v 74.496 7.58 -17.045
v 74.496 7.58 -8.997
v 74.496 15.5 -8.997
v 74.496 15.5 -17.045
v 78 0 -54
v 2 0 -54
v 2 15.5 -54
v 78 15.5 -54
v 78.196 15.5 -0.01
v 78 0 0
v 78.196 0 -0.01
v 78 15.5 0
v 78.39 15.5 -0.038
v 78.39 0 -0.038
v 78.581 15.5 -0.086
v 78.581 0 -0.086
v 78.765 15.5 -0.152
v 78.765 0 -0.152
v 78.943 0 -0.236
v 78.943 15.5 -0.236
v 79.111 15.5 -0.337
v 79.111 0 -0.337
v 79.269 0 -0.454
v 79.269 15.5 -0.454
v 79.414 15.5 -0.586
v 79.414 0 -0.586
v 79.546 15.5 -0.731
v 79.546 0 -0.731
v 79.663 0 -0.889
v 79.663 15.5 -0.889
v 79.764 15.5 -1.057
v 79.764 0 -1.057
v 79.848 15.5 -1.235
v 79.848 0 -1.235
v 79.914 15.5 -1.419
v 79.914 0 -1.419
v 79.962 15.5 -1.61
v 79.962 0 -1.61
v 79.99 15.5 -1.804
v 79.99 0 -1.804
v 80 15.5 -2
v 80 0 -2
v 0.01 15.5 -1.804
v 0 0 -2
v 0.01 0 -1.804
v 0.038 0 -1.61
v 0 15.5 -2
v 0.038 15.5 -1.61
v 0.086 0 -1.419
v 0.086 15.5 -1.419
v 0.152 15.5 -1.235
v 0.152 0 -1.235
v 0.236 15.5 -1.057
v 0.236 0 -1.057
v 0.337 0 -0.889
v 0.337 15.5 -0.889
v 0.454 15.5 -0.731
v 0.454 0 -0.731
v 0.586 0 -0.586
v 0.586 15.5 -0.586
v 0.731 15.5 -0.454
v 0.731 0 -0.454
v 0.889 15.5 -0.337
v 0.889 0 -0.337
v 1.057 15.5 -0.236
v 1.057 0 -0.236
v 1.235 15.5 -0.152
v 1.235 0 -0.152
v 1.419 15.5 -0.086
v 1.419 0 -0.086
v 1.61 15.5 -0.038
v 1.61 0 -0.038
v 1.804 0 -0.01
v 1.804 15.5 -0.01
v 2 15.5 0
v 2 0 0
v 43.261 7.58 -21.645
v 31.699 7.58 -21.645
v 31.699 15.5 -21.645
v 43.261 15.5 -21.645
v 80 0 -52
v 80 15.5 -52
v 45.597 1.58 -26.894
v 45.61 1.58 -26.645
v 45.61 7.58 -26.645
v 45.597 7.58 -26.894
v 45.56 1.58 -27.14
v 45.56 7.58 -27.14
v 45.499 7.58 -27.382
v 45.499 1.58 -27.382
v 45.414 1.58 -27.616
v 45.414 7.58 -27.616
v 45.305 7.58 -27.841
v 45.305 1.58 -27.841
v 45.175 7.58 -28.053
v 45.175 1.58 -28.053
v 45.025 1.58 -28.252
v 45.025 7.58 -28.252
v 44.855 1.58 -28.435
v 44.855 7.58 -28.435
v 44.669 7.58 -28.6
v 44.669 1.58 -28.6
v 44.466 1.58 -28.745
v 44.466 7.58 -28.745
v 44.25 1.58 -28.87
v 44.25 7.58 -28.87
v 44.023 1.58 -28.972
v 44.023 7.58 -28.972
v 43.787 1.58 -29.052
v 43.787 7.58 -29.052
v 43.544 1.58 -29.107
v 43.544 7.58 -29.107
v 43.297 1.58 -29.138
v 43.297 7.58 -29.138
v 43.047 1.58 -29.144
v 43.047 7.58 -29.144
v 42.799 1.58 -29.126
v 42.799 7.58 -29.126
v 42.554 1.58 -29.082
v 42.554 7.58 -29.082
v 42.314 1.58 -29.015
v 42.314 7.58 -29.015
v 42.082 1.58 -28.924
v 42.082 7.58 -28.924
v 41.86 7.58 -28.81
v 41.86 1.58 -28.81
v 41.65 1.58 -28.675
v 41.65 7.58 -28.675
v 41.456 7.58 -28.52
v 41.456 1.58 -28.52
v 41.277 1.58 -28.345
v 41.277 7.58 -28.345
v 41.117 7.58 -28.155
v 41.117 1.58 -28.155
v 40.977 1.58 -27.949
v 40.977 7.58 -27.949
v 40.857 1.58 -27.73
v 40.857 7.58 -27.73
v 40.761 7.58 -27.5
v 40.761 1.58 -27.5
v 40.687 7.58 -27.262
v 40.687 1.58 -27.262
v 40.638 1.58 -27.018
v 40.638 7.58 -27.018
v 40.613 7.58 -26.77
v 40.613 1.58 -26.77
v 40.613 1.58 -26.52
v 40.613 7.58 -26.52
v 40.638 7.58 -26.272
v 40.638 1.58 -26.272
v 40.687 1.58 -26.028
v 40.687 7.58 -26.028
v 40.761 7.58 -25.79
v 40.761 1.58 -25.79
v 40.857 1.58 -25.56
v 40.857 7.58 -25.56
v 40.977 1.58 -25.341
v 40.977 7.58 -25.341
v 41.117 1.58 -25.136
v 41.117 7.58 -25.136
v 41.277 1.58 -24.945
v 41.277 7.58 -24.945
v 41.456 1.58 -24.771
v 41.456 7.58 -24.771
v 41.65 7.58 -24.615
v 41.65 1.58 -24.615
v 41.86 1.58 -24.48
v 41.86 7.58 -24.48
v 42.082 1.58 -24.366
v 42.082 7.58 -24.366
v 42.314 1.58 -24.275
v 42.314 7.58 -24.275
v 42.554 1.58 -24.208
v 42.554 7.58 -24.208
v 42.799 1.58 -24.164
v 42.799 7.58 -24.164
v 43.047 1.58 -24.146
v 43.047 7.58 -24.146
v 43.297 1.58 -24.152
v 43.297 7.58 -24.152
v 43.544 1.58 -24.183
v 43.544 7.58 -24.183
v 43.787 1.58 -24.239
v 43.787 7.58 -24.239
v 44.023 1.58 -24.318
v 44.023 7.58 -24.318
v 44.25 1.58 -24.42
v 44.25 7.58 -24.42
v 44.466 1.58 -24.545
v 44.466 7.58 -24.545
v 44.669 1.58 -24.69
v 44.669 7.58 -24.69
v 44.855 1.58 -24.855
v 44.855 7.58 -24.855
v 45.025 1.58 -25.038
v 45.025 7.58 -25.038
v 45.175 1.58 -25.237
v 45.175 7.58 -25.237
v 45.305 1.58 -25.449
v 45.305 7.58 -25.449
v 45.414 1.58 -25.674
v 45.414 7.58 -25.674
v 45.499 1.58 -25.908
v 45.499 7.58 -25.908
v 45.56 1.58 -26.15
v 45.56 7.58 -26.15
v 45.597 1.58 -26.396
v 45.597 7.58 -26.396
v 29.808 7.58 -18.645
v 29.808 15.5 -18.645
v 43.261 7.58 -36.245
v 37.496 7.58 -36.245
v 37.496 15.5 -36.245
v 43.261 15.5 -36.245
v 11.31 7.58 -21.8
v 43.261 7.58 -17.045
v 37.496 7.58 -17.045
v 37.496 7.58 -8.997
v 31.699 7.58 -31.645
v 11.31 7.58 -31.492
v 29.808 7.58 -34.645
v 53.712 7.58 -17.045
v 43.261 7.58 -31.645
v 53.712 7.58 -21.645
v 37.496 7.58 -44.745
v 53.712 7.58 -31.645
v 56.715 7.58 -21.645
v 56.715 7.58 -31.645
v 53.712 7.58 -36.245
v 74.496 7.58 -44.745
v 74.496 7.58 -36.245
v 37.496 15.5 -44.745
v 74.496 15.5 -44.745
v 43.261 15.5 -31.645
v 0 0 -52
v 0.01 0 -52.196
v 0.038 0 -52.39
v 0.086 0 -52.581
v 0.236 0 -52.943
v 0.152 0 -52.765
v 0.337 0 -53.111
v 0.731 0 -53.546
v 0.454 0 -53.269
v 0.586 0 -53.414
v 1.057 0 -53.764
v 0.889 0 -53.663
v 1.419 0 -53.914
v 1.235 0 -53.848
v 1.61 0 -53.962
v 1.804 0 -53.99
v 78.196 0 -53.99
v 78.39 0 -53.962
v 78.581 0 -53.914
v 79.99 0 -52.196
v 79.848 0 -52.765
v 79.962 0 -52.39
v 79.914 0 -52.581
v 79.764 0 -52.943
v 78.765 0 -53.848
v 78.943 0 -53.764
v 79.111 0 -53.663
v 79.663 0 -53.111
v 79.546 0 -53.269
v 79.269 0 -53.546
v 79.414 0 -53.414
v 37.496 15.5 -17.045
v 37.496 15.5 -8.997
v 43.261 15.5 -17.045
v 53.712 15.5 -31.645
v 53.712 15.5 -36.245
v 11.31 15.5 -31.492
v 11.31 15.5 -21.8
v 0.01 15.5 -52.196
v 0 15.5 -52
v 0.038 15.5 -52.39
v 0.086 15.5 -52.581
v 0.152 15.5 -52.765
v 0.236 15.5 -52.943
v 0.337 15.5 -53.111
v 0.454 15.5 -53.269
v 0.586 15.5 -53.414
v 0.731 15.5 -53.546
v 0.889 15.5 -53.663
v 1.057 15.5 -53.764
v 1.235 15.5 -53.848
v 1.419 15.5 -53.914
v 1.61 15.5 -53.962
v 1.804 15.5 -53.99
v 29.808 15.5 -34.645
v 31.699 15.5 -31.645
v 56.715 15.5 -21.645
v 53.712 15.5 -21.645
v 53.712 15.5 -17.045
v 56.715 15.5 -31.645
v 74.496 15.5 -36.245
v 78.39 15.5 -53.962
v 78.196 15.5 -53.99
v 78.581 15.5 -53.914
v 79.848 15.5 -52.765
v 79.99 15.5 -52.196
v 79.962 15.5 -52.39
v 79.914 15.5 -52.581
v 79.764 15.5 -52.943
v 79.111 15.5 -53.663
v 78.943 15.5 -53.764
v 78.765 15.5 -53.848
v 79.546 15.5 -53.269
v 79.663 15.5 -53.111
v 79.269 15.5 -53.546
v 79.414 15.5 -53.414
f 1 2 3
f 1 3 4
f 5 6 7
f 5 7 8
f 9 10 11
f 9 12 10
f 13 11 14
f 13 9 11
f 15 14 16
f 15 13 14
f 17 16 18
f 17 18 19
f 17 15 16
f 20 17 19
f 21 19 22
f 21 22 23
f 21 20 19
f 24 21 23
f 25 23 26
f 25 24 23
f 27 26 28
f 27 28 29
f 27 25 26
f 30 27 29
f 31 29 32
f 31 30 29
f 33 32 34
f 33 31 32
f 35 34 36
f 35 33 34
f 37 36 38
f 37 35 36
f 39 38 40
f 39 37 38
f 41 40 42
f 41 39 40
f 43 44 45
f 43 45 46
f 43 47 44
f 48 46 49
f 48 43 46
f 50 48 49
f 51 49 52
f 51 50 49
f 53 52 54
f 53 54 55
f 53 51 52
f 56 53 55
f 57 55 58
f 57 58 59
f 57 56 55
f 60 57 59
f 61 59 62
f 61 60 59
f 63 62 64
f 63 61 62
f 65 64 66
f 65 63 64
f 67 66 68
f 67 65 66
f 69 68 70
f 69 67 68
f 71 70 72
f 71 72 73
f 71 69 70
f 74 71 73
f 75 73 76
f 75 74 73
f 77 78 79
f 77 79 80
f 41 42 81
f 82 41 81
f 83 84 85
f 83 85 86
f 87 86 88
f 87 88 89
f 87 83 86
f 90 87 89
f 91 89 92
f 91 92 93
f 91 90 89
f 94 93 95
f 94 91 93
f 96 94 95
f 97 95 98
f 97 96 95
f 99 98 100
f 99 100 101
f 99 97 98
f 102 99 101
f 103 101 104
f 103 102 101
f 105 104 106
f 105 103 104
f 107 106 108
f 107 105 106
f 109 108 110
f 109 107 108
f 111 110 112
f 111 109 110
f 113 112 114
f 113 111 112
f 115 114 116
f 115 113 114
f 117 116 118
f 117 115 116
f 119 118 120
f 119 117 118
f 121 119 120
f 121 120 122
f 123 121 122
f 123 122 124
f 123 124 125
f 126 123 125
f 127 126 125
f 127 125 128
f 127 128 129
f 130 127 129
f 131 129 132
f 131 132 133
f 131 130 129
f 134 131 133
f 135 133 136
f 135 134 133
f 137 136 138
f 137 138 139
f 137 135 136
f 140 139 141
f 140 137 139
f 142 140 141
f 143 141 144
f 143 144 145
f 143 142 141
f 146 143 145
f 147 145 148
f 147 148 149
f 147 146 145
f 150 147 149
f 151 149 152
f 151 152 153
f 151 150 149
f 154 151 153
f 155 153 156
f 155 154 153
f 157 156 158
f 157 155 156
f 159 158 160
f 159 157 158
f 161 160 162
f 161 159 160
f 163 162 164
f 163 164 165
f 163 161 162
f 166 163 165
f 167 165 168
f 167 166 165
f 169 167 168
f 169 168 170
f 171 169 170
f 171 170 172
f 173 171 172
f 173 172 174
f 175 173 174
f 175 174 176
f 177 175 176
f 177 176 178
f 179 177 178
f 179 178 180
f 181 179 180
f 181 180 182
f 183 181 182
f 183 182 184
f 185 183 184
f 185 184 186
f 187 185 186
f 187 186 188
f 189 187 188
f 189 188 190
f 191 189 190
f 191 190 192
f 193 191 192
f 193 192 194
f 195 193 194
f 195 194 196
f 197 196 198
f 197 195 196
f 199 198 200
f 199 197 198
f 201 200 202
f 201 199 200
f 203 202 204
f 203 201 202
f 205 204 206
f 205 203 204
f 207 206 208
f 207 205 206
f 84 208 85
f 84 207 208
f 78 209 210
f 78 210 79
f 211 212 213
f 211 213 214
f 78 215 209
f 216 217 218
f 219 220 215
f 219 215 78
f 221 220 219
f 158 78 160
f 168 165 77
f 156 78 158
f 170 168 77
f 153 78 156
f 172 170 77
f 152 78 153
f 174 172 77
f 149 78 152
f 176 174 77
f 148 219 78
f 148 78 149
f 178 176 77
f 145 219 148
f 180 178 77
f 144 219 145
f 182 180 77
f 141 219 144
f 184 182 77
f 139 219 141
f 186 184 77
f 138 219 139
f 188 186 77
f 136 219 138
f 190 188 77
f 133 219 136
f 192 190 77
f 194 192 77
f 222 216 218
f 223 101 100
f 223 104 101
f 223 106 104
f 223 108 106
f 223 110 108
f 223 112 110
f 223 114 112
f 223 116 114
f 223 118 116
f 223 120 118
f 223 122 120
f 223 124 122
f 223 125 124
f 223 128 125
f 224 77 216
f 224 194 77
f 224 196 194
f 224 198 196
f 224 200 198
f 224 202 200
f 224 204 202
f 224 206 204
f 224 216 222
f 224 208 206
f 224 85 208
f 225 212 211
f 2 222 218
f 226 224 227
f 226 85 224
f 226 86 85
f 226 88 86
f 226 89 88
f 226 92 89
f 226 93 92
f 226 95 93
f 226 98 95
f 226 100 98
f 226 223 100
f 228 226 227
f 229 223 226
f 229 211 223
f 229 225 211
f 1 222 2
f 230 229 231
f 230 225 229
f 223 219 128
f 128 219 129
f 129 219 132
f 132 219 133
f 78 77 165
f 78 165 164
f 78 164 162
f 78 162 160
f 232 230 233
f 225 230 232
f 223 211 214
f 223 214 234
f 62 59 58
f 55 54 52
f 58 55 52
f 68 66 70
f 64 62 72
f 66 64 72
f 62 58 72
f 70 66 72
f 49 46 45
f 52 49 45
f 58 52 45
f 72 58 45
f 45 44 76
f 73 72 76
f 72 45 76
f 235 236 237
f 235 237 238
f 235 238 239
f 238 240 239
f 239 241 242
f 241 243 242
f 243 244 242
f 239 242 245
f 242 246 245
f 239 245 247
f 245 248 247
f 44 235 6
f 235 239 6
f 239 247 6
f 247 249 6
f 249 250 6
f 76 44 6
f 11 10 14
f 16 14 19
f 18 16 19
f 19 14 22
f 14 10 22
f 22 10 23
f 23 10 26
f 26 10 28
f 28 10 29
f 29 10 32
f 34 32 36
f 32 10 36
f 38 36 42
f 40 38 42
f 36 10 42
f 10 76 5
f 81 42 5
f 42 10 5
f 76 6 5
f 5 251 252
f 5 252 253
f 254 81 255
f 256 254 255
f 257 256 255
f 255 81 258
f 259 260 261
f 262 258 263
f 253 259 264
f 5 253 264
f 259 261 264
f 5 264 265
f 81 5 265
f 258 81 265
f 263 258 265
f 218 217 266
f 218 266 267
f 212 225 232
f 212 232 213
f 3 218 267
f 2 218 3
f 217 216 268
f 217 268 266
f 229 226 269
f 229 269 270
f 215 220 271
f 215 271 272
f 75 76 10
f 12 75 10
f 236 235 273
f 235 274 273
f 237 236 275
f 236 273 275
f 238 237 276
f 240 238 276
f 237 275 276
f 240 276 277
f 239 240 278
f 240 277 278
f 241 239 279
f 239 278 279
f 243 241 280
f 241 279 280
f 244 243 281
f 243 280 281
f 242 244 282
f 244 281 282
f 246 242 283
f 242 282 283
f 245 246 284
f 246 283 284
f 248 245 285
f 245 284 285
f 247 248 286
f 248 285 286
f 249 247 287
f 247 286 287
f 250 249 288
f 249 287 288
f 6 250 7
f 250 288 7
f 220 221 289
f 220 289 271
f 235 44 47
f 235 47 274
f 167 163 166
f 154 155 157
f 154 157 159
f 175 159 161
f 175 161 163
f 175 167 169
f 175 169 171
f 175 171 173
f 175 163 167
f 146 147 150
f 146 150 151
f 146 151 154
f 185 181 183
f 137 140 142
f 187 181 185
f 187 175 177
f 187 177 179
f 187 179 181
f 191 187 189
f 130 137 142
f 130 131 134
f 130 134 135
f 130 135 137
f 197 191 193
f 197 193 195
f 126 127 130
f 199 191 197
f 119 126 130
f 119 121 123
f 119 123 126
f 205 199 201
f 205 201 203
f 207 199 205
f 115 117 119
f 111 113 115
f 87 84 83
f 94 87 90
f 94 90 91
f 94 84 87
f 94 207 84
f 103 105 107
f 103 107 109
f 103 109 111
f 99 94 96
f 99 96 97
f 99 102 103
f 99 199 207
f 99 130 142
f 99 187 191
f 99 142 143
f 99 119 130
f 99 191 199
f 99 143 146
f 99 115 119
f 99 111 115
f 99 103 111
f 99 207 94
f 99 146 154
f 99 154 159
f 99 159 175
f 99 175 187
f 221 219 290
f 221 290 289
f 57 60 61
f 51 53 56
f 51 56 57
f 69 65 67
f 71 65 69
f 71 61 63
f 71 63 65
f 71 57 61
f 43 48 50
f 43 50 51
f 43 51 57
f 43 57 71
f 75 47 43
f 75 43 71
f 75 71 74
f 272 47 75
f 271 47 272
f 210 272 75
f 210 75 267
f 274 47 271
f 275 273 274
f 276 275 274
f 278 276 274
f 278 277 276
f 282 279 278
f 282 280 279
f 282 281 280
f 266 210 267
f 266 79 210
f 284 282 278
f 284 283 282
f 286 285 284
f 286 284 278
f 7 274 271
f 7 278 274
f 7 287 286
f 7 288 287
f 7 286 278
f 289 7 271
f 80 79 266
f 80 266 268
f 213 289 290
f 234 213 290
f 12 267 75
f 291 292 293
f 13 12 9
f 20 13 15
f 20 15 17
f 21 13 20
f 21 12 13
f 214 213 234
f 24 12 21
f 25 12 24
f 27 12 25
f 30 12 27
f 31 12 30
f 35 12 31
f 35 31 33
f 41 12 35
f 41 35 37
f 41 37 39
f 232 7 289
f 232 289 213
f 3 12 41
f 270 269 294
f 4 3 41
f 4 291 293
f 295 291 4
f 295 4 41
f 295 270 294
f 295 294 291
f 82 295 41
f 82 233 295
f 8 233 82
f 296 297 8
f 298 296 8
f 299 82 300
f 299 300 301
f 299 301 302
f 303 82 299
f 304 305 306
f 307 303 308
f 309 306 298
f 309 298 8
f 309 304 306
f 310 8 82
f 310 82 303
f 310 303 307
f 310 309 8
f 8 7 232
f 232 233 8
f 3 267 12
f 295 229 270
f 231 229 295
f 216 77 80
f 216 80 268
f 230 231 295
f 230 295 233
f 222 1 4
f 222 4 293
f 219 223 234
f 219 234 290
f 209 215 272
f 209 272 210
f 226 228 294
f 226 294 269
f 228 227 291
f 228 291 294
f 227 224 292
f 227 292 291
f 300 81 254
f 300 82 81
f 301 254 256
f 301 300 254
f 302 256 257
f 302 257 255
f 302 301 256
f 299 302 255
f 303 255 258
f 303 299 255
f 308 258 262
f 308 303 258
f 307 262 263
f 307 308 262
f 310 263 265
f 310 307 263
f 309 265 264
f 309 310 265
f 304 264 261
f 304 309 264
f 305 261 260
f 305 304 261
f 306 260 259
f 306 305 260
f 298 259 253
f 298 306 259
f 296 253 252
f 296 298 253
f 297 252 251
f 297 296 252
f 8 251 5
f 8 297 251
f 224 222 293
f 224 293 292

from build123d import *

# Parameters (mm, degrees)
SKETCH1_W           = 80
SKETCH1_H           = 54
BOSS_EXTRUDE2_DEPTH = 15.5
FILLET1_R           = 2
Y_WING_START        = -26.76167351
Y_WING_DEPTH        = 8
Y_WING_START_2      = -32.76167351
Y_WING_2_OUTLINE_R  = 2.5
Y_WING_2_DEPTH      = 6


with BuildPart() as part:
    # Sketch1 → Boss-Extrude2 (new body)
    with BuildSketch(Plane(origin=(0, 0, 0), x_dir=(1, 0, 0), z_dir=(0, 1, 0))):
        with Locations((40, 27)):
            Rectangle(SKETCH1_W, SKETCH1_H)
    extrude(amount=BOSS_EXTRUDE2_DEPTH)

    # Fillet1
    fillet1_edges = [part.edges().sort_by_distance(p)[0] for p in [
        (0, 7.75, -54),
        (80, 7.75, -54),
        (80, 7.75, 0),
        (0, 7.75, 0),
    ]]
    fillet(fillet1_edges, radius=FILLET1_R)


with BuildPart() as body_2:
    # Y-Wing: read off the stored shape, not the designer's step
    # Y-Wing outline → Y-Wing (new body)
    with BuildSketch(Plane(origin=(0, 0, 0), x_dir=(1, 0, 0), z_dir=(0, 1, 0)).offset(Y_WING_START)):
        Polygon((-37.998848216, 80.77793428), (-49.561243891, 80.77793428), (-51.452110178, 83.77793428), (-69.950345376, 80.625586413), (-69.950345376, 70.93293428), (-51.452110178, 67.77793428), (-49.561243891, 70.77793428), (-37.998848216, 70.77793428), (-37.998848216, 66.17793428), (-43.764531914, 66.17793428), (-43.764531914, 58.130000785), (-6.764531914, 58.130000785), (-6.764531914, 66.17793428), (-27.548546514, 66.17793428), (-27.548546514, 70.77793428), (-24.545586254, 70.77793428), (-24.545586254, 80.77793428), (-27.548546514, 80.77793428), (-27.548546514, 85.37793428), (-6.764531914, 85.37793428), (-6.764531914, 93.87793428), (-43.764531914, 93.87793428), (-43.764531914, 85.37793428), (-37.998848216, 85.37793428), align=None)
    extrude(amount=Y_WING_DEPTH)

    # Y-Wing 2 outline → Y-Wing 2 (add)
    with BuildSketch(Plane(origin=(0, 0, 0), x_dir=(1, 0, 0), z_dir=(0, 1, 0)).offset(Y_WING_START_2)):
        with Locations((-38.150345376, 75.778331613)):
            Circle(Y_WING_2_OUTLINE_R)
    extrude(amount=Y_WING_2_DEPTH)


with BuildPart() as body_2_1:
    # Body-Move/Copy3: moved
    add(body_2.part.moved(Location((81.260162004, 34.341820547, 49.133266847))))


with BuildPart() as part_1:
    add(part.part)

    # Intersect1: read off the stored shape, not the designer's step
    # Intersect1: cut body 2
    add(body_2_1.part, mode=Mode.SUBTRACT)


solid = part_1.part
